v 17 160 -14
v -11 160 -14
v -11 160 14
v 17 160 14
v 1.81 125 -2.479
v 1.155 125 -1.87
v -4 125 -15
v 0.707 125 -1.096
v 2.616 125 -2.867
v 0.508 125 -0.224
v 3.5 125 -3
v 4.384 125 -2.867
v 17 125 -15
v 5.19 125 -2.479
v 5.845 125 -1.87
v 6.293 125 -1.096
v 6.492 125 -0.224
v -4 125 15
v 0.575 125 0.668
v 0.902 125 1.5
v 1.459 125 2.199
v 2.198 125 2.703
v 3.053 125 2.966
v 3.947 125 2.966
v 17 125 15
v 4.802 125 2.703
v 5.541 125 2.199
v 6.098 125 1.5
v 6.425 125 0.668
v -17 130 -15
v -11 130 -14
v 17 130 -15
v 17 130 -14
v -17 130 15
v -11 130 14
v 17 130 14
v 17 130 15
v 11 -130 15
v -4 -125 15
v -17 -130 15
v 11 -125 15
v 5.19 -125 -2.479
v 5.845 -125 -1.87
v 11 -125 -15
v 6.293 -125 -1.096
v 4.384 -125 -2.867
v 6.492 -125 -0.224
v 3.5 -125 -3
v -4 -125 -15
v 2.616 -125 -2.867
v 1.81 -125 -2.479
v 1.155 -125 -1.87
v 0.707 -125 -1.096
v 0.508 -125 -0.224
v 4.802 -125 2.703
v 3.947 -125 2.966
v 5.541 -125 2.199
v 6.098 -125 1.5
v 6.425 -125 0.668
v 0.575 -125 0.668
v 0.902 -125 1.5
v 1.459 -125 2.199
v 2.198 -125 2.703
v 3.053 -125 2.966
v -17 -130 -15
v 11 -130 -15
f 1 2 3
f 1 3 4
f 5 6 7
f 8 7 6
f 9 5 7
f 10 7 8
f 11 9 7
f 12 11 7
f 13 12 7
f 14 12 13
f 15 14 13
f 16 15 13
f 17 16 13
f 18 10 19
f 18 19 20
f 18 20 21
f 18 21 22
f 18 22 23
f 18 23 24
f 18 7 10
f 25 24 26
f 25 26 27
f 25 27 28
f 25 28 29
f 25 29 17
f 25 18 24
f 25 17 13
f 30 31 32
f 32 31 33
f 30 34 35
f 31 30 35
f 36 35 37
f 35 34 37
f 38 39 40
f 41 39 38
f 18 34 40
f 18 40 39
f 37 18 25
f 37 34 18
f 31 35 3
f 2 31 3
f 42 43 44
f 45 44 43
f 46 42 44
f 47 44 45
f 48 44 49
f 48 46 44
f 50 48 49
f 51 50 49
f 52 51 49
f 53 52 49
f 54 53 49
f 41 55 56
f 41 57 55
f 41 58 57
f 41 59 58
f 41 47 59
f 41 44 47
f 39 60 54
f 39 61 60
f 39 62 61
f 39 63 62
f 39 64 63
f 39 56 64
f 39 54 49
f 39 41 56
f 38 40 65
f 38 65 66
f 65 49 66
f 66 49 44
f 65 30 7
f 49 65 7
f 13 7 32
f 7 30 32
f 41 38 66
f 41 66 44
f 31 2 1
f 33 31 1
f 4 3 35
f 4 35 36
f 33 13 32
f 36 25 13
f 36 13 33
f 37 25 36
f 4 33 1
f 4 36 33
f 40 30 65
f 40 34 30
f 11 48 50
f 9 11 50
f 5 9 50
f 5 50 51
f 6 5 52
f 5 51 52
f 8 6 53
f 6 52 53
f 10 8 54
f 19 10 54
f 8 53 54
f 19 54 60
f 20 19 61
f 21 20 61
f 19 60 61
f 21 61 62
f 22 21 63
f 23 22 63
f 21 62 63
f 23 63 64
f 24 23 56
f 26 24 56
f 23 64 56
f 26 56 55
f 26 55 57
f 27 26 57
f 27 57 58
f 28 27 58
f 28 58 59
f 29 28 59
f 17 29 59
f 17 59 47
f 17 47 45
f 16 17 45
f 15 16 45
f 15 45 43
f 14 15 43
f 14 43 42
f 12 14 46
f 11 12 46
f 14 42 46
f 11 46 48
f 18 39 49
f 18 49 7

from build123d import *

# Parameters (mm, degrees)
SKETCH1_W           = 34
SKETCH1_H           = 5
SKETCH1_W_2         = 13
SKETCH1_H_2         = 250
BOSS_EXTRUDE1_DEPTH = 15
SKETCH1_3_W         = 28
SKETCH1_3_H         = 30
BOSS_EXTRUDE2_DEPTH = 14
SKETCH2_R           = 3
BOSS_EXTRUDE3_DEPTH = 250


with BuildPart() as part:
    # Sketch1 → Boss-Extrude1 (new, symmetric)
    with BuildSketch(Plane.XY):
        with Locations((0, 127.5)):
            Rectangle(SKETCH1_W, SKETCH1_H)
        with Locations((-10.5, 0)):
            Rectangle(SKETCH1_W_2, SKETCH1_H_2)
        Polygon((-4, -125), (-17, -125), (-17, -130), (11, -130), (11, -125), align=None)
    extrude(amount=BOSS_EXTRUDE1_DEPTH, both=True)

    # Sketch1<3> → Boss-Extrude2 (add, symmetric)
    with BuildSketch(Plane.XY):
        with Locations((3, 145)):
            Rectangle(SKETCH1_3_W, SKETCH1_3_H)
    extrude(amount=BOSS_EXTRUDE2_DEPTH, both=True)

    # Sketch2 → Boss-Extrude3 (add)
    with BuildSketch(Plane(origin=(0, -125, 0), x_dir=(1, 0, 0), z_dir=(0, 1, 0))):
        with Locations(Location((3.5, 0, 0), (0, 0, 90))):
            Circle(SKETCH2_R)
    extrude(amount=BOSS_EXTRUDE3_DEPTH)


solid = part.part
